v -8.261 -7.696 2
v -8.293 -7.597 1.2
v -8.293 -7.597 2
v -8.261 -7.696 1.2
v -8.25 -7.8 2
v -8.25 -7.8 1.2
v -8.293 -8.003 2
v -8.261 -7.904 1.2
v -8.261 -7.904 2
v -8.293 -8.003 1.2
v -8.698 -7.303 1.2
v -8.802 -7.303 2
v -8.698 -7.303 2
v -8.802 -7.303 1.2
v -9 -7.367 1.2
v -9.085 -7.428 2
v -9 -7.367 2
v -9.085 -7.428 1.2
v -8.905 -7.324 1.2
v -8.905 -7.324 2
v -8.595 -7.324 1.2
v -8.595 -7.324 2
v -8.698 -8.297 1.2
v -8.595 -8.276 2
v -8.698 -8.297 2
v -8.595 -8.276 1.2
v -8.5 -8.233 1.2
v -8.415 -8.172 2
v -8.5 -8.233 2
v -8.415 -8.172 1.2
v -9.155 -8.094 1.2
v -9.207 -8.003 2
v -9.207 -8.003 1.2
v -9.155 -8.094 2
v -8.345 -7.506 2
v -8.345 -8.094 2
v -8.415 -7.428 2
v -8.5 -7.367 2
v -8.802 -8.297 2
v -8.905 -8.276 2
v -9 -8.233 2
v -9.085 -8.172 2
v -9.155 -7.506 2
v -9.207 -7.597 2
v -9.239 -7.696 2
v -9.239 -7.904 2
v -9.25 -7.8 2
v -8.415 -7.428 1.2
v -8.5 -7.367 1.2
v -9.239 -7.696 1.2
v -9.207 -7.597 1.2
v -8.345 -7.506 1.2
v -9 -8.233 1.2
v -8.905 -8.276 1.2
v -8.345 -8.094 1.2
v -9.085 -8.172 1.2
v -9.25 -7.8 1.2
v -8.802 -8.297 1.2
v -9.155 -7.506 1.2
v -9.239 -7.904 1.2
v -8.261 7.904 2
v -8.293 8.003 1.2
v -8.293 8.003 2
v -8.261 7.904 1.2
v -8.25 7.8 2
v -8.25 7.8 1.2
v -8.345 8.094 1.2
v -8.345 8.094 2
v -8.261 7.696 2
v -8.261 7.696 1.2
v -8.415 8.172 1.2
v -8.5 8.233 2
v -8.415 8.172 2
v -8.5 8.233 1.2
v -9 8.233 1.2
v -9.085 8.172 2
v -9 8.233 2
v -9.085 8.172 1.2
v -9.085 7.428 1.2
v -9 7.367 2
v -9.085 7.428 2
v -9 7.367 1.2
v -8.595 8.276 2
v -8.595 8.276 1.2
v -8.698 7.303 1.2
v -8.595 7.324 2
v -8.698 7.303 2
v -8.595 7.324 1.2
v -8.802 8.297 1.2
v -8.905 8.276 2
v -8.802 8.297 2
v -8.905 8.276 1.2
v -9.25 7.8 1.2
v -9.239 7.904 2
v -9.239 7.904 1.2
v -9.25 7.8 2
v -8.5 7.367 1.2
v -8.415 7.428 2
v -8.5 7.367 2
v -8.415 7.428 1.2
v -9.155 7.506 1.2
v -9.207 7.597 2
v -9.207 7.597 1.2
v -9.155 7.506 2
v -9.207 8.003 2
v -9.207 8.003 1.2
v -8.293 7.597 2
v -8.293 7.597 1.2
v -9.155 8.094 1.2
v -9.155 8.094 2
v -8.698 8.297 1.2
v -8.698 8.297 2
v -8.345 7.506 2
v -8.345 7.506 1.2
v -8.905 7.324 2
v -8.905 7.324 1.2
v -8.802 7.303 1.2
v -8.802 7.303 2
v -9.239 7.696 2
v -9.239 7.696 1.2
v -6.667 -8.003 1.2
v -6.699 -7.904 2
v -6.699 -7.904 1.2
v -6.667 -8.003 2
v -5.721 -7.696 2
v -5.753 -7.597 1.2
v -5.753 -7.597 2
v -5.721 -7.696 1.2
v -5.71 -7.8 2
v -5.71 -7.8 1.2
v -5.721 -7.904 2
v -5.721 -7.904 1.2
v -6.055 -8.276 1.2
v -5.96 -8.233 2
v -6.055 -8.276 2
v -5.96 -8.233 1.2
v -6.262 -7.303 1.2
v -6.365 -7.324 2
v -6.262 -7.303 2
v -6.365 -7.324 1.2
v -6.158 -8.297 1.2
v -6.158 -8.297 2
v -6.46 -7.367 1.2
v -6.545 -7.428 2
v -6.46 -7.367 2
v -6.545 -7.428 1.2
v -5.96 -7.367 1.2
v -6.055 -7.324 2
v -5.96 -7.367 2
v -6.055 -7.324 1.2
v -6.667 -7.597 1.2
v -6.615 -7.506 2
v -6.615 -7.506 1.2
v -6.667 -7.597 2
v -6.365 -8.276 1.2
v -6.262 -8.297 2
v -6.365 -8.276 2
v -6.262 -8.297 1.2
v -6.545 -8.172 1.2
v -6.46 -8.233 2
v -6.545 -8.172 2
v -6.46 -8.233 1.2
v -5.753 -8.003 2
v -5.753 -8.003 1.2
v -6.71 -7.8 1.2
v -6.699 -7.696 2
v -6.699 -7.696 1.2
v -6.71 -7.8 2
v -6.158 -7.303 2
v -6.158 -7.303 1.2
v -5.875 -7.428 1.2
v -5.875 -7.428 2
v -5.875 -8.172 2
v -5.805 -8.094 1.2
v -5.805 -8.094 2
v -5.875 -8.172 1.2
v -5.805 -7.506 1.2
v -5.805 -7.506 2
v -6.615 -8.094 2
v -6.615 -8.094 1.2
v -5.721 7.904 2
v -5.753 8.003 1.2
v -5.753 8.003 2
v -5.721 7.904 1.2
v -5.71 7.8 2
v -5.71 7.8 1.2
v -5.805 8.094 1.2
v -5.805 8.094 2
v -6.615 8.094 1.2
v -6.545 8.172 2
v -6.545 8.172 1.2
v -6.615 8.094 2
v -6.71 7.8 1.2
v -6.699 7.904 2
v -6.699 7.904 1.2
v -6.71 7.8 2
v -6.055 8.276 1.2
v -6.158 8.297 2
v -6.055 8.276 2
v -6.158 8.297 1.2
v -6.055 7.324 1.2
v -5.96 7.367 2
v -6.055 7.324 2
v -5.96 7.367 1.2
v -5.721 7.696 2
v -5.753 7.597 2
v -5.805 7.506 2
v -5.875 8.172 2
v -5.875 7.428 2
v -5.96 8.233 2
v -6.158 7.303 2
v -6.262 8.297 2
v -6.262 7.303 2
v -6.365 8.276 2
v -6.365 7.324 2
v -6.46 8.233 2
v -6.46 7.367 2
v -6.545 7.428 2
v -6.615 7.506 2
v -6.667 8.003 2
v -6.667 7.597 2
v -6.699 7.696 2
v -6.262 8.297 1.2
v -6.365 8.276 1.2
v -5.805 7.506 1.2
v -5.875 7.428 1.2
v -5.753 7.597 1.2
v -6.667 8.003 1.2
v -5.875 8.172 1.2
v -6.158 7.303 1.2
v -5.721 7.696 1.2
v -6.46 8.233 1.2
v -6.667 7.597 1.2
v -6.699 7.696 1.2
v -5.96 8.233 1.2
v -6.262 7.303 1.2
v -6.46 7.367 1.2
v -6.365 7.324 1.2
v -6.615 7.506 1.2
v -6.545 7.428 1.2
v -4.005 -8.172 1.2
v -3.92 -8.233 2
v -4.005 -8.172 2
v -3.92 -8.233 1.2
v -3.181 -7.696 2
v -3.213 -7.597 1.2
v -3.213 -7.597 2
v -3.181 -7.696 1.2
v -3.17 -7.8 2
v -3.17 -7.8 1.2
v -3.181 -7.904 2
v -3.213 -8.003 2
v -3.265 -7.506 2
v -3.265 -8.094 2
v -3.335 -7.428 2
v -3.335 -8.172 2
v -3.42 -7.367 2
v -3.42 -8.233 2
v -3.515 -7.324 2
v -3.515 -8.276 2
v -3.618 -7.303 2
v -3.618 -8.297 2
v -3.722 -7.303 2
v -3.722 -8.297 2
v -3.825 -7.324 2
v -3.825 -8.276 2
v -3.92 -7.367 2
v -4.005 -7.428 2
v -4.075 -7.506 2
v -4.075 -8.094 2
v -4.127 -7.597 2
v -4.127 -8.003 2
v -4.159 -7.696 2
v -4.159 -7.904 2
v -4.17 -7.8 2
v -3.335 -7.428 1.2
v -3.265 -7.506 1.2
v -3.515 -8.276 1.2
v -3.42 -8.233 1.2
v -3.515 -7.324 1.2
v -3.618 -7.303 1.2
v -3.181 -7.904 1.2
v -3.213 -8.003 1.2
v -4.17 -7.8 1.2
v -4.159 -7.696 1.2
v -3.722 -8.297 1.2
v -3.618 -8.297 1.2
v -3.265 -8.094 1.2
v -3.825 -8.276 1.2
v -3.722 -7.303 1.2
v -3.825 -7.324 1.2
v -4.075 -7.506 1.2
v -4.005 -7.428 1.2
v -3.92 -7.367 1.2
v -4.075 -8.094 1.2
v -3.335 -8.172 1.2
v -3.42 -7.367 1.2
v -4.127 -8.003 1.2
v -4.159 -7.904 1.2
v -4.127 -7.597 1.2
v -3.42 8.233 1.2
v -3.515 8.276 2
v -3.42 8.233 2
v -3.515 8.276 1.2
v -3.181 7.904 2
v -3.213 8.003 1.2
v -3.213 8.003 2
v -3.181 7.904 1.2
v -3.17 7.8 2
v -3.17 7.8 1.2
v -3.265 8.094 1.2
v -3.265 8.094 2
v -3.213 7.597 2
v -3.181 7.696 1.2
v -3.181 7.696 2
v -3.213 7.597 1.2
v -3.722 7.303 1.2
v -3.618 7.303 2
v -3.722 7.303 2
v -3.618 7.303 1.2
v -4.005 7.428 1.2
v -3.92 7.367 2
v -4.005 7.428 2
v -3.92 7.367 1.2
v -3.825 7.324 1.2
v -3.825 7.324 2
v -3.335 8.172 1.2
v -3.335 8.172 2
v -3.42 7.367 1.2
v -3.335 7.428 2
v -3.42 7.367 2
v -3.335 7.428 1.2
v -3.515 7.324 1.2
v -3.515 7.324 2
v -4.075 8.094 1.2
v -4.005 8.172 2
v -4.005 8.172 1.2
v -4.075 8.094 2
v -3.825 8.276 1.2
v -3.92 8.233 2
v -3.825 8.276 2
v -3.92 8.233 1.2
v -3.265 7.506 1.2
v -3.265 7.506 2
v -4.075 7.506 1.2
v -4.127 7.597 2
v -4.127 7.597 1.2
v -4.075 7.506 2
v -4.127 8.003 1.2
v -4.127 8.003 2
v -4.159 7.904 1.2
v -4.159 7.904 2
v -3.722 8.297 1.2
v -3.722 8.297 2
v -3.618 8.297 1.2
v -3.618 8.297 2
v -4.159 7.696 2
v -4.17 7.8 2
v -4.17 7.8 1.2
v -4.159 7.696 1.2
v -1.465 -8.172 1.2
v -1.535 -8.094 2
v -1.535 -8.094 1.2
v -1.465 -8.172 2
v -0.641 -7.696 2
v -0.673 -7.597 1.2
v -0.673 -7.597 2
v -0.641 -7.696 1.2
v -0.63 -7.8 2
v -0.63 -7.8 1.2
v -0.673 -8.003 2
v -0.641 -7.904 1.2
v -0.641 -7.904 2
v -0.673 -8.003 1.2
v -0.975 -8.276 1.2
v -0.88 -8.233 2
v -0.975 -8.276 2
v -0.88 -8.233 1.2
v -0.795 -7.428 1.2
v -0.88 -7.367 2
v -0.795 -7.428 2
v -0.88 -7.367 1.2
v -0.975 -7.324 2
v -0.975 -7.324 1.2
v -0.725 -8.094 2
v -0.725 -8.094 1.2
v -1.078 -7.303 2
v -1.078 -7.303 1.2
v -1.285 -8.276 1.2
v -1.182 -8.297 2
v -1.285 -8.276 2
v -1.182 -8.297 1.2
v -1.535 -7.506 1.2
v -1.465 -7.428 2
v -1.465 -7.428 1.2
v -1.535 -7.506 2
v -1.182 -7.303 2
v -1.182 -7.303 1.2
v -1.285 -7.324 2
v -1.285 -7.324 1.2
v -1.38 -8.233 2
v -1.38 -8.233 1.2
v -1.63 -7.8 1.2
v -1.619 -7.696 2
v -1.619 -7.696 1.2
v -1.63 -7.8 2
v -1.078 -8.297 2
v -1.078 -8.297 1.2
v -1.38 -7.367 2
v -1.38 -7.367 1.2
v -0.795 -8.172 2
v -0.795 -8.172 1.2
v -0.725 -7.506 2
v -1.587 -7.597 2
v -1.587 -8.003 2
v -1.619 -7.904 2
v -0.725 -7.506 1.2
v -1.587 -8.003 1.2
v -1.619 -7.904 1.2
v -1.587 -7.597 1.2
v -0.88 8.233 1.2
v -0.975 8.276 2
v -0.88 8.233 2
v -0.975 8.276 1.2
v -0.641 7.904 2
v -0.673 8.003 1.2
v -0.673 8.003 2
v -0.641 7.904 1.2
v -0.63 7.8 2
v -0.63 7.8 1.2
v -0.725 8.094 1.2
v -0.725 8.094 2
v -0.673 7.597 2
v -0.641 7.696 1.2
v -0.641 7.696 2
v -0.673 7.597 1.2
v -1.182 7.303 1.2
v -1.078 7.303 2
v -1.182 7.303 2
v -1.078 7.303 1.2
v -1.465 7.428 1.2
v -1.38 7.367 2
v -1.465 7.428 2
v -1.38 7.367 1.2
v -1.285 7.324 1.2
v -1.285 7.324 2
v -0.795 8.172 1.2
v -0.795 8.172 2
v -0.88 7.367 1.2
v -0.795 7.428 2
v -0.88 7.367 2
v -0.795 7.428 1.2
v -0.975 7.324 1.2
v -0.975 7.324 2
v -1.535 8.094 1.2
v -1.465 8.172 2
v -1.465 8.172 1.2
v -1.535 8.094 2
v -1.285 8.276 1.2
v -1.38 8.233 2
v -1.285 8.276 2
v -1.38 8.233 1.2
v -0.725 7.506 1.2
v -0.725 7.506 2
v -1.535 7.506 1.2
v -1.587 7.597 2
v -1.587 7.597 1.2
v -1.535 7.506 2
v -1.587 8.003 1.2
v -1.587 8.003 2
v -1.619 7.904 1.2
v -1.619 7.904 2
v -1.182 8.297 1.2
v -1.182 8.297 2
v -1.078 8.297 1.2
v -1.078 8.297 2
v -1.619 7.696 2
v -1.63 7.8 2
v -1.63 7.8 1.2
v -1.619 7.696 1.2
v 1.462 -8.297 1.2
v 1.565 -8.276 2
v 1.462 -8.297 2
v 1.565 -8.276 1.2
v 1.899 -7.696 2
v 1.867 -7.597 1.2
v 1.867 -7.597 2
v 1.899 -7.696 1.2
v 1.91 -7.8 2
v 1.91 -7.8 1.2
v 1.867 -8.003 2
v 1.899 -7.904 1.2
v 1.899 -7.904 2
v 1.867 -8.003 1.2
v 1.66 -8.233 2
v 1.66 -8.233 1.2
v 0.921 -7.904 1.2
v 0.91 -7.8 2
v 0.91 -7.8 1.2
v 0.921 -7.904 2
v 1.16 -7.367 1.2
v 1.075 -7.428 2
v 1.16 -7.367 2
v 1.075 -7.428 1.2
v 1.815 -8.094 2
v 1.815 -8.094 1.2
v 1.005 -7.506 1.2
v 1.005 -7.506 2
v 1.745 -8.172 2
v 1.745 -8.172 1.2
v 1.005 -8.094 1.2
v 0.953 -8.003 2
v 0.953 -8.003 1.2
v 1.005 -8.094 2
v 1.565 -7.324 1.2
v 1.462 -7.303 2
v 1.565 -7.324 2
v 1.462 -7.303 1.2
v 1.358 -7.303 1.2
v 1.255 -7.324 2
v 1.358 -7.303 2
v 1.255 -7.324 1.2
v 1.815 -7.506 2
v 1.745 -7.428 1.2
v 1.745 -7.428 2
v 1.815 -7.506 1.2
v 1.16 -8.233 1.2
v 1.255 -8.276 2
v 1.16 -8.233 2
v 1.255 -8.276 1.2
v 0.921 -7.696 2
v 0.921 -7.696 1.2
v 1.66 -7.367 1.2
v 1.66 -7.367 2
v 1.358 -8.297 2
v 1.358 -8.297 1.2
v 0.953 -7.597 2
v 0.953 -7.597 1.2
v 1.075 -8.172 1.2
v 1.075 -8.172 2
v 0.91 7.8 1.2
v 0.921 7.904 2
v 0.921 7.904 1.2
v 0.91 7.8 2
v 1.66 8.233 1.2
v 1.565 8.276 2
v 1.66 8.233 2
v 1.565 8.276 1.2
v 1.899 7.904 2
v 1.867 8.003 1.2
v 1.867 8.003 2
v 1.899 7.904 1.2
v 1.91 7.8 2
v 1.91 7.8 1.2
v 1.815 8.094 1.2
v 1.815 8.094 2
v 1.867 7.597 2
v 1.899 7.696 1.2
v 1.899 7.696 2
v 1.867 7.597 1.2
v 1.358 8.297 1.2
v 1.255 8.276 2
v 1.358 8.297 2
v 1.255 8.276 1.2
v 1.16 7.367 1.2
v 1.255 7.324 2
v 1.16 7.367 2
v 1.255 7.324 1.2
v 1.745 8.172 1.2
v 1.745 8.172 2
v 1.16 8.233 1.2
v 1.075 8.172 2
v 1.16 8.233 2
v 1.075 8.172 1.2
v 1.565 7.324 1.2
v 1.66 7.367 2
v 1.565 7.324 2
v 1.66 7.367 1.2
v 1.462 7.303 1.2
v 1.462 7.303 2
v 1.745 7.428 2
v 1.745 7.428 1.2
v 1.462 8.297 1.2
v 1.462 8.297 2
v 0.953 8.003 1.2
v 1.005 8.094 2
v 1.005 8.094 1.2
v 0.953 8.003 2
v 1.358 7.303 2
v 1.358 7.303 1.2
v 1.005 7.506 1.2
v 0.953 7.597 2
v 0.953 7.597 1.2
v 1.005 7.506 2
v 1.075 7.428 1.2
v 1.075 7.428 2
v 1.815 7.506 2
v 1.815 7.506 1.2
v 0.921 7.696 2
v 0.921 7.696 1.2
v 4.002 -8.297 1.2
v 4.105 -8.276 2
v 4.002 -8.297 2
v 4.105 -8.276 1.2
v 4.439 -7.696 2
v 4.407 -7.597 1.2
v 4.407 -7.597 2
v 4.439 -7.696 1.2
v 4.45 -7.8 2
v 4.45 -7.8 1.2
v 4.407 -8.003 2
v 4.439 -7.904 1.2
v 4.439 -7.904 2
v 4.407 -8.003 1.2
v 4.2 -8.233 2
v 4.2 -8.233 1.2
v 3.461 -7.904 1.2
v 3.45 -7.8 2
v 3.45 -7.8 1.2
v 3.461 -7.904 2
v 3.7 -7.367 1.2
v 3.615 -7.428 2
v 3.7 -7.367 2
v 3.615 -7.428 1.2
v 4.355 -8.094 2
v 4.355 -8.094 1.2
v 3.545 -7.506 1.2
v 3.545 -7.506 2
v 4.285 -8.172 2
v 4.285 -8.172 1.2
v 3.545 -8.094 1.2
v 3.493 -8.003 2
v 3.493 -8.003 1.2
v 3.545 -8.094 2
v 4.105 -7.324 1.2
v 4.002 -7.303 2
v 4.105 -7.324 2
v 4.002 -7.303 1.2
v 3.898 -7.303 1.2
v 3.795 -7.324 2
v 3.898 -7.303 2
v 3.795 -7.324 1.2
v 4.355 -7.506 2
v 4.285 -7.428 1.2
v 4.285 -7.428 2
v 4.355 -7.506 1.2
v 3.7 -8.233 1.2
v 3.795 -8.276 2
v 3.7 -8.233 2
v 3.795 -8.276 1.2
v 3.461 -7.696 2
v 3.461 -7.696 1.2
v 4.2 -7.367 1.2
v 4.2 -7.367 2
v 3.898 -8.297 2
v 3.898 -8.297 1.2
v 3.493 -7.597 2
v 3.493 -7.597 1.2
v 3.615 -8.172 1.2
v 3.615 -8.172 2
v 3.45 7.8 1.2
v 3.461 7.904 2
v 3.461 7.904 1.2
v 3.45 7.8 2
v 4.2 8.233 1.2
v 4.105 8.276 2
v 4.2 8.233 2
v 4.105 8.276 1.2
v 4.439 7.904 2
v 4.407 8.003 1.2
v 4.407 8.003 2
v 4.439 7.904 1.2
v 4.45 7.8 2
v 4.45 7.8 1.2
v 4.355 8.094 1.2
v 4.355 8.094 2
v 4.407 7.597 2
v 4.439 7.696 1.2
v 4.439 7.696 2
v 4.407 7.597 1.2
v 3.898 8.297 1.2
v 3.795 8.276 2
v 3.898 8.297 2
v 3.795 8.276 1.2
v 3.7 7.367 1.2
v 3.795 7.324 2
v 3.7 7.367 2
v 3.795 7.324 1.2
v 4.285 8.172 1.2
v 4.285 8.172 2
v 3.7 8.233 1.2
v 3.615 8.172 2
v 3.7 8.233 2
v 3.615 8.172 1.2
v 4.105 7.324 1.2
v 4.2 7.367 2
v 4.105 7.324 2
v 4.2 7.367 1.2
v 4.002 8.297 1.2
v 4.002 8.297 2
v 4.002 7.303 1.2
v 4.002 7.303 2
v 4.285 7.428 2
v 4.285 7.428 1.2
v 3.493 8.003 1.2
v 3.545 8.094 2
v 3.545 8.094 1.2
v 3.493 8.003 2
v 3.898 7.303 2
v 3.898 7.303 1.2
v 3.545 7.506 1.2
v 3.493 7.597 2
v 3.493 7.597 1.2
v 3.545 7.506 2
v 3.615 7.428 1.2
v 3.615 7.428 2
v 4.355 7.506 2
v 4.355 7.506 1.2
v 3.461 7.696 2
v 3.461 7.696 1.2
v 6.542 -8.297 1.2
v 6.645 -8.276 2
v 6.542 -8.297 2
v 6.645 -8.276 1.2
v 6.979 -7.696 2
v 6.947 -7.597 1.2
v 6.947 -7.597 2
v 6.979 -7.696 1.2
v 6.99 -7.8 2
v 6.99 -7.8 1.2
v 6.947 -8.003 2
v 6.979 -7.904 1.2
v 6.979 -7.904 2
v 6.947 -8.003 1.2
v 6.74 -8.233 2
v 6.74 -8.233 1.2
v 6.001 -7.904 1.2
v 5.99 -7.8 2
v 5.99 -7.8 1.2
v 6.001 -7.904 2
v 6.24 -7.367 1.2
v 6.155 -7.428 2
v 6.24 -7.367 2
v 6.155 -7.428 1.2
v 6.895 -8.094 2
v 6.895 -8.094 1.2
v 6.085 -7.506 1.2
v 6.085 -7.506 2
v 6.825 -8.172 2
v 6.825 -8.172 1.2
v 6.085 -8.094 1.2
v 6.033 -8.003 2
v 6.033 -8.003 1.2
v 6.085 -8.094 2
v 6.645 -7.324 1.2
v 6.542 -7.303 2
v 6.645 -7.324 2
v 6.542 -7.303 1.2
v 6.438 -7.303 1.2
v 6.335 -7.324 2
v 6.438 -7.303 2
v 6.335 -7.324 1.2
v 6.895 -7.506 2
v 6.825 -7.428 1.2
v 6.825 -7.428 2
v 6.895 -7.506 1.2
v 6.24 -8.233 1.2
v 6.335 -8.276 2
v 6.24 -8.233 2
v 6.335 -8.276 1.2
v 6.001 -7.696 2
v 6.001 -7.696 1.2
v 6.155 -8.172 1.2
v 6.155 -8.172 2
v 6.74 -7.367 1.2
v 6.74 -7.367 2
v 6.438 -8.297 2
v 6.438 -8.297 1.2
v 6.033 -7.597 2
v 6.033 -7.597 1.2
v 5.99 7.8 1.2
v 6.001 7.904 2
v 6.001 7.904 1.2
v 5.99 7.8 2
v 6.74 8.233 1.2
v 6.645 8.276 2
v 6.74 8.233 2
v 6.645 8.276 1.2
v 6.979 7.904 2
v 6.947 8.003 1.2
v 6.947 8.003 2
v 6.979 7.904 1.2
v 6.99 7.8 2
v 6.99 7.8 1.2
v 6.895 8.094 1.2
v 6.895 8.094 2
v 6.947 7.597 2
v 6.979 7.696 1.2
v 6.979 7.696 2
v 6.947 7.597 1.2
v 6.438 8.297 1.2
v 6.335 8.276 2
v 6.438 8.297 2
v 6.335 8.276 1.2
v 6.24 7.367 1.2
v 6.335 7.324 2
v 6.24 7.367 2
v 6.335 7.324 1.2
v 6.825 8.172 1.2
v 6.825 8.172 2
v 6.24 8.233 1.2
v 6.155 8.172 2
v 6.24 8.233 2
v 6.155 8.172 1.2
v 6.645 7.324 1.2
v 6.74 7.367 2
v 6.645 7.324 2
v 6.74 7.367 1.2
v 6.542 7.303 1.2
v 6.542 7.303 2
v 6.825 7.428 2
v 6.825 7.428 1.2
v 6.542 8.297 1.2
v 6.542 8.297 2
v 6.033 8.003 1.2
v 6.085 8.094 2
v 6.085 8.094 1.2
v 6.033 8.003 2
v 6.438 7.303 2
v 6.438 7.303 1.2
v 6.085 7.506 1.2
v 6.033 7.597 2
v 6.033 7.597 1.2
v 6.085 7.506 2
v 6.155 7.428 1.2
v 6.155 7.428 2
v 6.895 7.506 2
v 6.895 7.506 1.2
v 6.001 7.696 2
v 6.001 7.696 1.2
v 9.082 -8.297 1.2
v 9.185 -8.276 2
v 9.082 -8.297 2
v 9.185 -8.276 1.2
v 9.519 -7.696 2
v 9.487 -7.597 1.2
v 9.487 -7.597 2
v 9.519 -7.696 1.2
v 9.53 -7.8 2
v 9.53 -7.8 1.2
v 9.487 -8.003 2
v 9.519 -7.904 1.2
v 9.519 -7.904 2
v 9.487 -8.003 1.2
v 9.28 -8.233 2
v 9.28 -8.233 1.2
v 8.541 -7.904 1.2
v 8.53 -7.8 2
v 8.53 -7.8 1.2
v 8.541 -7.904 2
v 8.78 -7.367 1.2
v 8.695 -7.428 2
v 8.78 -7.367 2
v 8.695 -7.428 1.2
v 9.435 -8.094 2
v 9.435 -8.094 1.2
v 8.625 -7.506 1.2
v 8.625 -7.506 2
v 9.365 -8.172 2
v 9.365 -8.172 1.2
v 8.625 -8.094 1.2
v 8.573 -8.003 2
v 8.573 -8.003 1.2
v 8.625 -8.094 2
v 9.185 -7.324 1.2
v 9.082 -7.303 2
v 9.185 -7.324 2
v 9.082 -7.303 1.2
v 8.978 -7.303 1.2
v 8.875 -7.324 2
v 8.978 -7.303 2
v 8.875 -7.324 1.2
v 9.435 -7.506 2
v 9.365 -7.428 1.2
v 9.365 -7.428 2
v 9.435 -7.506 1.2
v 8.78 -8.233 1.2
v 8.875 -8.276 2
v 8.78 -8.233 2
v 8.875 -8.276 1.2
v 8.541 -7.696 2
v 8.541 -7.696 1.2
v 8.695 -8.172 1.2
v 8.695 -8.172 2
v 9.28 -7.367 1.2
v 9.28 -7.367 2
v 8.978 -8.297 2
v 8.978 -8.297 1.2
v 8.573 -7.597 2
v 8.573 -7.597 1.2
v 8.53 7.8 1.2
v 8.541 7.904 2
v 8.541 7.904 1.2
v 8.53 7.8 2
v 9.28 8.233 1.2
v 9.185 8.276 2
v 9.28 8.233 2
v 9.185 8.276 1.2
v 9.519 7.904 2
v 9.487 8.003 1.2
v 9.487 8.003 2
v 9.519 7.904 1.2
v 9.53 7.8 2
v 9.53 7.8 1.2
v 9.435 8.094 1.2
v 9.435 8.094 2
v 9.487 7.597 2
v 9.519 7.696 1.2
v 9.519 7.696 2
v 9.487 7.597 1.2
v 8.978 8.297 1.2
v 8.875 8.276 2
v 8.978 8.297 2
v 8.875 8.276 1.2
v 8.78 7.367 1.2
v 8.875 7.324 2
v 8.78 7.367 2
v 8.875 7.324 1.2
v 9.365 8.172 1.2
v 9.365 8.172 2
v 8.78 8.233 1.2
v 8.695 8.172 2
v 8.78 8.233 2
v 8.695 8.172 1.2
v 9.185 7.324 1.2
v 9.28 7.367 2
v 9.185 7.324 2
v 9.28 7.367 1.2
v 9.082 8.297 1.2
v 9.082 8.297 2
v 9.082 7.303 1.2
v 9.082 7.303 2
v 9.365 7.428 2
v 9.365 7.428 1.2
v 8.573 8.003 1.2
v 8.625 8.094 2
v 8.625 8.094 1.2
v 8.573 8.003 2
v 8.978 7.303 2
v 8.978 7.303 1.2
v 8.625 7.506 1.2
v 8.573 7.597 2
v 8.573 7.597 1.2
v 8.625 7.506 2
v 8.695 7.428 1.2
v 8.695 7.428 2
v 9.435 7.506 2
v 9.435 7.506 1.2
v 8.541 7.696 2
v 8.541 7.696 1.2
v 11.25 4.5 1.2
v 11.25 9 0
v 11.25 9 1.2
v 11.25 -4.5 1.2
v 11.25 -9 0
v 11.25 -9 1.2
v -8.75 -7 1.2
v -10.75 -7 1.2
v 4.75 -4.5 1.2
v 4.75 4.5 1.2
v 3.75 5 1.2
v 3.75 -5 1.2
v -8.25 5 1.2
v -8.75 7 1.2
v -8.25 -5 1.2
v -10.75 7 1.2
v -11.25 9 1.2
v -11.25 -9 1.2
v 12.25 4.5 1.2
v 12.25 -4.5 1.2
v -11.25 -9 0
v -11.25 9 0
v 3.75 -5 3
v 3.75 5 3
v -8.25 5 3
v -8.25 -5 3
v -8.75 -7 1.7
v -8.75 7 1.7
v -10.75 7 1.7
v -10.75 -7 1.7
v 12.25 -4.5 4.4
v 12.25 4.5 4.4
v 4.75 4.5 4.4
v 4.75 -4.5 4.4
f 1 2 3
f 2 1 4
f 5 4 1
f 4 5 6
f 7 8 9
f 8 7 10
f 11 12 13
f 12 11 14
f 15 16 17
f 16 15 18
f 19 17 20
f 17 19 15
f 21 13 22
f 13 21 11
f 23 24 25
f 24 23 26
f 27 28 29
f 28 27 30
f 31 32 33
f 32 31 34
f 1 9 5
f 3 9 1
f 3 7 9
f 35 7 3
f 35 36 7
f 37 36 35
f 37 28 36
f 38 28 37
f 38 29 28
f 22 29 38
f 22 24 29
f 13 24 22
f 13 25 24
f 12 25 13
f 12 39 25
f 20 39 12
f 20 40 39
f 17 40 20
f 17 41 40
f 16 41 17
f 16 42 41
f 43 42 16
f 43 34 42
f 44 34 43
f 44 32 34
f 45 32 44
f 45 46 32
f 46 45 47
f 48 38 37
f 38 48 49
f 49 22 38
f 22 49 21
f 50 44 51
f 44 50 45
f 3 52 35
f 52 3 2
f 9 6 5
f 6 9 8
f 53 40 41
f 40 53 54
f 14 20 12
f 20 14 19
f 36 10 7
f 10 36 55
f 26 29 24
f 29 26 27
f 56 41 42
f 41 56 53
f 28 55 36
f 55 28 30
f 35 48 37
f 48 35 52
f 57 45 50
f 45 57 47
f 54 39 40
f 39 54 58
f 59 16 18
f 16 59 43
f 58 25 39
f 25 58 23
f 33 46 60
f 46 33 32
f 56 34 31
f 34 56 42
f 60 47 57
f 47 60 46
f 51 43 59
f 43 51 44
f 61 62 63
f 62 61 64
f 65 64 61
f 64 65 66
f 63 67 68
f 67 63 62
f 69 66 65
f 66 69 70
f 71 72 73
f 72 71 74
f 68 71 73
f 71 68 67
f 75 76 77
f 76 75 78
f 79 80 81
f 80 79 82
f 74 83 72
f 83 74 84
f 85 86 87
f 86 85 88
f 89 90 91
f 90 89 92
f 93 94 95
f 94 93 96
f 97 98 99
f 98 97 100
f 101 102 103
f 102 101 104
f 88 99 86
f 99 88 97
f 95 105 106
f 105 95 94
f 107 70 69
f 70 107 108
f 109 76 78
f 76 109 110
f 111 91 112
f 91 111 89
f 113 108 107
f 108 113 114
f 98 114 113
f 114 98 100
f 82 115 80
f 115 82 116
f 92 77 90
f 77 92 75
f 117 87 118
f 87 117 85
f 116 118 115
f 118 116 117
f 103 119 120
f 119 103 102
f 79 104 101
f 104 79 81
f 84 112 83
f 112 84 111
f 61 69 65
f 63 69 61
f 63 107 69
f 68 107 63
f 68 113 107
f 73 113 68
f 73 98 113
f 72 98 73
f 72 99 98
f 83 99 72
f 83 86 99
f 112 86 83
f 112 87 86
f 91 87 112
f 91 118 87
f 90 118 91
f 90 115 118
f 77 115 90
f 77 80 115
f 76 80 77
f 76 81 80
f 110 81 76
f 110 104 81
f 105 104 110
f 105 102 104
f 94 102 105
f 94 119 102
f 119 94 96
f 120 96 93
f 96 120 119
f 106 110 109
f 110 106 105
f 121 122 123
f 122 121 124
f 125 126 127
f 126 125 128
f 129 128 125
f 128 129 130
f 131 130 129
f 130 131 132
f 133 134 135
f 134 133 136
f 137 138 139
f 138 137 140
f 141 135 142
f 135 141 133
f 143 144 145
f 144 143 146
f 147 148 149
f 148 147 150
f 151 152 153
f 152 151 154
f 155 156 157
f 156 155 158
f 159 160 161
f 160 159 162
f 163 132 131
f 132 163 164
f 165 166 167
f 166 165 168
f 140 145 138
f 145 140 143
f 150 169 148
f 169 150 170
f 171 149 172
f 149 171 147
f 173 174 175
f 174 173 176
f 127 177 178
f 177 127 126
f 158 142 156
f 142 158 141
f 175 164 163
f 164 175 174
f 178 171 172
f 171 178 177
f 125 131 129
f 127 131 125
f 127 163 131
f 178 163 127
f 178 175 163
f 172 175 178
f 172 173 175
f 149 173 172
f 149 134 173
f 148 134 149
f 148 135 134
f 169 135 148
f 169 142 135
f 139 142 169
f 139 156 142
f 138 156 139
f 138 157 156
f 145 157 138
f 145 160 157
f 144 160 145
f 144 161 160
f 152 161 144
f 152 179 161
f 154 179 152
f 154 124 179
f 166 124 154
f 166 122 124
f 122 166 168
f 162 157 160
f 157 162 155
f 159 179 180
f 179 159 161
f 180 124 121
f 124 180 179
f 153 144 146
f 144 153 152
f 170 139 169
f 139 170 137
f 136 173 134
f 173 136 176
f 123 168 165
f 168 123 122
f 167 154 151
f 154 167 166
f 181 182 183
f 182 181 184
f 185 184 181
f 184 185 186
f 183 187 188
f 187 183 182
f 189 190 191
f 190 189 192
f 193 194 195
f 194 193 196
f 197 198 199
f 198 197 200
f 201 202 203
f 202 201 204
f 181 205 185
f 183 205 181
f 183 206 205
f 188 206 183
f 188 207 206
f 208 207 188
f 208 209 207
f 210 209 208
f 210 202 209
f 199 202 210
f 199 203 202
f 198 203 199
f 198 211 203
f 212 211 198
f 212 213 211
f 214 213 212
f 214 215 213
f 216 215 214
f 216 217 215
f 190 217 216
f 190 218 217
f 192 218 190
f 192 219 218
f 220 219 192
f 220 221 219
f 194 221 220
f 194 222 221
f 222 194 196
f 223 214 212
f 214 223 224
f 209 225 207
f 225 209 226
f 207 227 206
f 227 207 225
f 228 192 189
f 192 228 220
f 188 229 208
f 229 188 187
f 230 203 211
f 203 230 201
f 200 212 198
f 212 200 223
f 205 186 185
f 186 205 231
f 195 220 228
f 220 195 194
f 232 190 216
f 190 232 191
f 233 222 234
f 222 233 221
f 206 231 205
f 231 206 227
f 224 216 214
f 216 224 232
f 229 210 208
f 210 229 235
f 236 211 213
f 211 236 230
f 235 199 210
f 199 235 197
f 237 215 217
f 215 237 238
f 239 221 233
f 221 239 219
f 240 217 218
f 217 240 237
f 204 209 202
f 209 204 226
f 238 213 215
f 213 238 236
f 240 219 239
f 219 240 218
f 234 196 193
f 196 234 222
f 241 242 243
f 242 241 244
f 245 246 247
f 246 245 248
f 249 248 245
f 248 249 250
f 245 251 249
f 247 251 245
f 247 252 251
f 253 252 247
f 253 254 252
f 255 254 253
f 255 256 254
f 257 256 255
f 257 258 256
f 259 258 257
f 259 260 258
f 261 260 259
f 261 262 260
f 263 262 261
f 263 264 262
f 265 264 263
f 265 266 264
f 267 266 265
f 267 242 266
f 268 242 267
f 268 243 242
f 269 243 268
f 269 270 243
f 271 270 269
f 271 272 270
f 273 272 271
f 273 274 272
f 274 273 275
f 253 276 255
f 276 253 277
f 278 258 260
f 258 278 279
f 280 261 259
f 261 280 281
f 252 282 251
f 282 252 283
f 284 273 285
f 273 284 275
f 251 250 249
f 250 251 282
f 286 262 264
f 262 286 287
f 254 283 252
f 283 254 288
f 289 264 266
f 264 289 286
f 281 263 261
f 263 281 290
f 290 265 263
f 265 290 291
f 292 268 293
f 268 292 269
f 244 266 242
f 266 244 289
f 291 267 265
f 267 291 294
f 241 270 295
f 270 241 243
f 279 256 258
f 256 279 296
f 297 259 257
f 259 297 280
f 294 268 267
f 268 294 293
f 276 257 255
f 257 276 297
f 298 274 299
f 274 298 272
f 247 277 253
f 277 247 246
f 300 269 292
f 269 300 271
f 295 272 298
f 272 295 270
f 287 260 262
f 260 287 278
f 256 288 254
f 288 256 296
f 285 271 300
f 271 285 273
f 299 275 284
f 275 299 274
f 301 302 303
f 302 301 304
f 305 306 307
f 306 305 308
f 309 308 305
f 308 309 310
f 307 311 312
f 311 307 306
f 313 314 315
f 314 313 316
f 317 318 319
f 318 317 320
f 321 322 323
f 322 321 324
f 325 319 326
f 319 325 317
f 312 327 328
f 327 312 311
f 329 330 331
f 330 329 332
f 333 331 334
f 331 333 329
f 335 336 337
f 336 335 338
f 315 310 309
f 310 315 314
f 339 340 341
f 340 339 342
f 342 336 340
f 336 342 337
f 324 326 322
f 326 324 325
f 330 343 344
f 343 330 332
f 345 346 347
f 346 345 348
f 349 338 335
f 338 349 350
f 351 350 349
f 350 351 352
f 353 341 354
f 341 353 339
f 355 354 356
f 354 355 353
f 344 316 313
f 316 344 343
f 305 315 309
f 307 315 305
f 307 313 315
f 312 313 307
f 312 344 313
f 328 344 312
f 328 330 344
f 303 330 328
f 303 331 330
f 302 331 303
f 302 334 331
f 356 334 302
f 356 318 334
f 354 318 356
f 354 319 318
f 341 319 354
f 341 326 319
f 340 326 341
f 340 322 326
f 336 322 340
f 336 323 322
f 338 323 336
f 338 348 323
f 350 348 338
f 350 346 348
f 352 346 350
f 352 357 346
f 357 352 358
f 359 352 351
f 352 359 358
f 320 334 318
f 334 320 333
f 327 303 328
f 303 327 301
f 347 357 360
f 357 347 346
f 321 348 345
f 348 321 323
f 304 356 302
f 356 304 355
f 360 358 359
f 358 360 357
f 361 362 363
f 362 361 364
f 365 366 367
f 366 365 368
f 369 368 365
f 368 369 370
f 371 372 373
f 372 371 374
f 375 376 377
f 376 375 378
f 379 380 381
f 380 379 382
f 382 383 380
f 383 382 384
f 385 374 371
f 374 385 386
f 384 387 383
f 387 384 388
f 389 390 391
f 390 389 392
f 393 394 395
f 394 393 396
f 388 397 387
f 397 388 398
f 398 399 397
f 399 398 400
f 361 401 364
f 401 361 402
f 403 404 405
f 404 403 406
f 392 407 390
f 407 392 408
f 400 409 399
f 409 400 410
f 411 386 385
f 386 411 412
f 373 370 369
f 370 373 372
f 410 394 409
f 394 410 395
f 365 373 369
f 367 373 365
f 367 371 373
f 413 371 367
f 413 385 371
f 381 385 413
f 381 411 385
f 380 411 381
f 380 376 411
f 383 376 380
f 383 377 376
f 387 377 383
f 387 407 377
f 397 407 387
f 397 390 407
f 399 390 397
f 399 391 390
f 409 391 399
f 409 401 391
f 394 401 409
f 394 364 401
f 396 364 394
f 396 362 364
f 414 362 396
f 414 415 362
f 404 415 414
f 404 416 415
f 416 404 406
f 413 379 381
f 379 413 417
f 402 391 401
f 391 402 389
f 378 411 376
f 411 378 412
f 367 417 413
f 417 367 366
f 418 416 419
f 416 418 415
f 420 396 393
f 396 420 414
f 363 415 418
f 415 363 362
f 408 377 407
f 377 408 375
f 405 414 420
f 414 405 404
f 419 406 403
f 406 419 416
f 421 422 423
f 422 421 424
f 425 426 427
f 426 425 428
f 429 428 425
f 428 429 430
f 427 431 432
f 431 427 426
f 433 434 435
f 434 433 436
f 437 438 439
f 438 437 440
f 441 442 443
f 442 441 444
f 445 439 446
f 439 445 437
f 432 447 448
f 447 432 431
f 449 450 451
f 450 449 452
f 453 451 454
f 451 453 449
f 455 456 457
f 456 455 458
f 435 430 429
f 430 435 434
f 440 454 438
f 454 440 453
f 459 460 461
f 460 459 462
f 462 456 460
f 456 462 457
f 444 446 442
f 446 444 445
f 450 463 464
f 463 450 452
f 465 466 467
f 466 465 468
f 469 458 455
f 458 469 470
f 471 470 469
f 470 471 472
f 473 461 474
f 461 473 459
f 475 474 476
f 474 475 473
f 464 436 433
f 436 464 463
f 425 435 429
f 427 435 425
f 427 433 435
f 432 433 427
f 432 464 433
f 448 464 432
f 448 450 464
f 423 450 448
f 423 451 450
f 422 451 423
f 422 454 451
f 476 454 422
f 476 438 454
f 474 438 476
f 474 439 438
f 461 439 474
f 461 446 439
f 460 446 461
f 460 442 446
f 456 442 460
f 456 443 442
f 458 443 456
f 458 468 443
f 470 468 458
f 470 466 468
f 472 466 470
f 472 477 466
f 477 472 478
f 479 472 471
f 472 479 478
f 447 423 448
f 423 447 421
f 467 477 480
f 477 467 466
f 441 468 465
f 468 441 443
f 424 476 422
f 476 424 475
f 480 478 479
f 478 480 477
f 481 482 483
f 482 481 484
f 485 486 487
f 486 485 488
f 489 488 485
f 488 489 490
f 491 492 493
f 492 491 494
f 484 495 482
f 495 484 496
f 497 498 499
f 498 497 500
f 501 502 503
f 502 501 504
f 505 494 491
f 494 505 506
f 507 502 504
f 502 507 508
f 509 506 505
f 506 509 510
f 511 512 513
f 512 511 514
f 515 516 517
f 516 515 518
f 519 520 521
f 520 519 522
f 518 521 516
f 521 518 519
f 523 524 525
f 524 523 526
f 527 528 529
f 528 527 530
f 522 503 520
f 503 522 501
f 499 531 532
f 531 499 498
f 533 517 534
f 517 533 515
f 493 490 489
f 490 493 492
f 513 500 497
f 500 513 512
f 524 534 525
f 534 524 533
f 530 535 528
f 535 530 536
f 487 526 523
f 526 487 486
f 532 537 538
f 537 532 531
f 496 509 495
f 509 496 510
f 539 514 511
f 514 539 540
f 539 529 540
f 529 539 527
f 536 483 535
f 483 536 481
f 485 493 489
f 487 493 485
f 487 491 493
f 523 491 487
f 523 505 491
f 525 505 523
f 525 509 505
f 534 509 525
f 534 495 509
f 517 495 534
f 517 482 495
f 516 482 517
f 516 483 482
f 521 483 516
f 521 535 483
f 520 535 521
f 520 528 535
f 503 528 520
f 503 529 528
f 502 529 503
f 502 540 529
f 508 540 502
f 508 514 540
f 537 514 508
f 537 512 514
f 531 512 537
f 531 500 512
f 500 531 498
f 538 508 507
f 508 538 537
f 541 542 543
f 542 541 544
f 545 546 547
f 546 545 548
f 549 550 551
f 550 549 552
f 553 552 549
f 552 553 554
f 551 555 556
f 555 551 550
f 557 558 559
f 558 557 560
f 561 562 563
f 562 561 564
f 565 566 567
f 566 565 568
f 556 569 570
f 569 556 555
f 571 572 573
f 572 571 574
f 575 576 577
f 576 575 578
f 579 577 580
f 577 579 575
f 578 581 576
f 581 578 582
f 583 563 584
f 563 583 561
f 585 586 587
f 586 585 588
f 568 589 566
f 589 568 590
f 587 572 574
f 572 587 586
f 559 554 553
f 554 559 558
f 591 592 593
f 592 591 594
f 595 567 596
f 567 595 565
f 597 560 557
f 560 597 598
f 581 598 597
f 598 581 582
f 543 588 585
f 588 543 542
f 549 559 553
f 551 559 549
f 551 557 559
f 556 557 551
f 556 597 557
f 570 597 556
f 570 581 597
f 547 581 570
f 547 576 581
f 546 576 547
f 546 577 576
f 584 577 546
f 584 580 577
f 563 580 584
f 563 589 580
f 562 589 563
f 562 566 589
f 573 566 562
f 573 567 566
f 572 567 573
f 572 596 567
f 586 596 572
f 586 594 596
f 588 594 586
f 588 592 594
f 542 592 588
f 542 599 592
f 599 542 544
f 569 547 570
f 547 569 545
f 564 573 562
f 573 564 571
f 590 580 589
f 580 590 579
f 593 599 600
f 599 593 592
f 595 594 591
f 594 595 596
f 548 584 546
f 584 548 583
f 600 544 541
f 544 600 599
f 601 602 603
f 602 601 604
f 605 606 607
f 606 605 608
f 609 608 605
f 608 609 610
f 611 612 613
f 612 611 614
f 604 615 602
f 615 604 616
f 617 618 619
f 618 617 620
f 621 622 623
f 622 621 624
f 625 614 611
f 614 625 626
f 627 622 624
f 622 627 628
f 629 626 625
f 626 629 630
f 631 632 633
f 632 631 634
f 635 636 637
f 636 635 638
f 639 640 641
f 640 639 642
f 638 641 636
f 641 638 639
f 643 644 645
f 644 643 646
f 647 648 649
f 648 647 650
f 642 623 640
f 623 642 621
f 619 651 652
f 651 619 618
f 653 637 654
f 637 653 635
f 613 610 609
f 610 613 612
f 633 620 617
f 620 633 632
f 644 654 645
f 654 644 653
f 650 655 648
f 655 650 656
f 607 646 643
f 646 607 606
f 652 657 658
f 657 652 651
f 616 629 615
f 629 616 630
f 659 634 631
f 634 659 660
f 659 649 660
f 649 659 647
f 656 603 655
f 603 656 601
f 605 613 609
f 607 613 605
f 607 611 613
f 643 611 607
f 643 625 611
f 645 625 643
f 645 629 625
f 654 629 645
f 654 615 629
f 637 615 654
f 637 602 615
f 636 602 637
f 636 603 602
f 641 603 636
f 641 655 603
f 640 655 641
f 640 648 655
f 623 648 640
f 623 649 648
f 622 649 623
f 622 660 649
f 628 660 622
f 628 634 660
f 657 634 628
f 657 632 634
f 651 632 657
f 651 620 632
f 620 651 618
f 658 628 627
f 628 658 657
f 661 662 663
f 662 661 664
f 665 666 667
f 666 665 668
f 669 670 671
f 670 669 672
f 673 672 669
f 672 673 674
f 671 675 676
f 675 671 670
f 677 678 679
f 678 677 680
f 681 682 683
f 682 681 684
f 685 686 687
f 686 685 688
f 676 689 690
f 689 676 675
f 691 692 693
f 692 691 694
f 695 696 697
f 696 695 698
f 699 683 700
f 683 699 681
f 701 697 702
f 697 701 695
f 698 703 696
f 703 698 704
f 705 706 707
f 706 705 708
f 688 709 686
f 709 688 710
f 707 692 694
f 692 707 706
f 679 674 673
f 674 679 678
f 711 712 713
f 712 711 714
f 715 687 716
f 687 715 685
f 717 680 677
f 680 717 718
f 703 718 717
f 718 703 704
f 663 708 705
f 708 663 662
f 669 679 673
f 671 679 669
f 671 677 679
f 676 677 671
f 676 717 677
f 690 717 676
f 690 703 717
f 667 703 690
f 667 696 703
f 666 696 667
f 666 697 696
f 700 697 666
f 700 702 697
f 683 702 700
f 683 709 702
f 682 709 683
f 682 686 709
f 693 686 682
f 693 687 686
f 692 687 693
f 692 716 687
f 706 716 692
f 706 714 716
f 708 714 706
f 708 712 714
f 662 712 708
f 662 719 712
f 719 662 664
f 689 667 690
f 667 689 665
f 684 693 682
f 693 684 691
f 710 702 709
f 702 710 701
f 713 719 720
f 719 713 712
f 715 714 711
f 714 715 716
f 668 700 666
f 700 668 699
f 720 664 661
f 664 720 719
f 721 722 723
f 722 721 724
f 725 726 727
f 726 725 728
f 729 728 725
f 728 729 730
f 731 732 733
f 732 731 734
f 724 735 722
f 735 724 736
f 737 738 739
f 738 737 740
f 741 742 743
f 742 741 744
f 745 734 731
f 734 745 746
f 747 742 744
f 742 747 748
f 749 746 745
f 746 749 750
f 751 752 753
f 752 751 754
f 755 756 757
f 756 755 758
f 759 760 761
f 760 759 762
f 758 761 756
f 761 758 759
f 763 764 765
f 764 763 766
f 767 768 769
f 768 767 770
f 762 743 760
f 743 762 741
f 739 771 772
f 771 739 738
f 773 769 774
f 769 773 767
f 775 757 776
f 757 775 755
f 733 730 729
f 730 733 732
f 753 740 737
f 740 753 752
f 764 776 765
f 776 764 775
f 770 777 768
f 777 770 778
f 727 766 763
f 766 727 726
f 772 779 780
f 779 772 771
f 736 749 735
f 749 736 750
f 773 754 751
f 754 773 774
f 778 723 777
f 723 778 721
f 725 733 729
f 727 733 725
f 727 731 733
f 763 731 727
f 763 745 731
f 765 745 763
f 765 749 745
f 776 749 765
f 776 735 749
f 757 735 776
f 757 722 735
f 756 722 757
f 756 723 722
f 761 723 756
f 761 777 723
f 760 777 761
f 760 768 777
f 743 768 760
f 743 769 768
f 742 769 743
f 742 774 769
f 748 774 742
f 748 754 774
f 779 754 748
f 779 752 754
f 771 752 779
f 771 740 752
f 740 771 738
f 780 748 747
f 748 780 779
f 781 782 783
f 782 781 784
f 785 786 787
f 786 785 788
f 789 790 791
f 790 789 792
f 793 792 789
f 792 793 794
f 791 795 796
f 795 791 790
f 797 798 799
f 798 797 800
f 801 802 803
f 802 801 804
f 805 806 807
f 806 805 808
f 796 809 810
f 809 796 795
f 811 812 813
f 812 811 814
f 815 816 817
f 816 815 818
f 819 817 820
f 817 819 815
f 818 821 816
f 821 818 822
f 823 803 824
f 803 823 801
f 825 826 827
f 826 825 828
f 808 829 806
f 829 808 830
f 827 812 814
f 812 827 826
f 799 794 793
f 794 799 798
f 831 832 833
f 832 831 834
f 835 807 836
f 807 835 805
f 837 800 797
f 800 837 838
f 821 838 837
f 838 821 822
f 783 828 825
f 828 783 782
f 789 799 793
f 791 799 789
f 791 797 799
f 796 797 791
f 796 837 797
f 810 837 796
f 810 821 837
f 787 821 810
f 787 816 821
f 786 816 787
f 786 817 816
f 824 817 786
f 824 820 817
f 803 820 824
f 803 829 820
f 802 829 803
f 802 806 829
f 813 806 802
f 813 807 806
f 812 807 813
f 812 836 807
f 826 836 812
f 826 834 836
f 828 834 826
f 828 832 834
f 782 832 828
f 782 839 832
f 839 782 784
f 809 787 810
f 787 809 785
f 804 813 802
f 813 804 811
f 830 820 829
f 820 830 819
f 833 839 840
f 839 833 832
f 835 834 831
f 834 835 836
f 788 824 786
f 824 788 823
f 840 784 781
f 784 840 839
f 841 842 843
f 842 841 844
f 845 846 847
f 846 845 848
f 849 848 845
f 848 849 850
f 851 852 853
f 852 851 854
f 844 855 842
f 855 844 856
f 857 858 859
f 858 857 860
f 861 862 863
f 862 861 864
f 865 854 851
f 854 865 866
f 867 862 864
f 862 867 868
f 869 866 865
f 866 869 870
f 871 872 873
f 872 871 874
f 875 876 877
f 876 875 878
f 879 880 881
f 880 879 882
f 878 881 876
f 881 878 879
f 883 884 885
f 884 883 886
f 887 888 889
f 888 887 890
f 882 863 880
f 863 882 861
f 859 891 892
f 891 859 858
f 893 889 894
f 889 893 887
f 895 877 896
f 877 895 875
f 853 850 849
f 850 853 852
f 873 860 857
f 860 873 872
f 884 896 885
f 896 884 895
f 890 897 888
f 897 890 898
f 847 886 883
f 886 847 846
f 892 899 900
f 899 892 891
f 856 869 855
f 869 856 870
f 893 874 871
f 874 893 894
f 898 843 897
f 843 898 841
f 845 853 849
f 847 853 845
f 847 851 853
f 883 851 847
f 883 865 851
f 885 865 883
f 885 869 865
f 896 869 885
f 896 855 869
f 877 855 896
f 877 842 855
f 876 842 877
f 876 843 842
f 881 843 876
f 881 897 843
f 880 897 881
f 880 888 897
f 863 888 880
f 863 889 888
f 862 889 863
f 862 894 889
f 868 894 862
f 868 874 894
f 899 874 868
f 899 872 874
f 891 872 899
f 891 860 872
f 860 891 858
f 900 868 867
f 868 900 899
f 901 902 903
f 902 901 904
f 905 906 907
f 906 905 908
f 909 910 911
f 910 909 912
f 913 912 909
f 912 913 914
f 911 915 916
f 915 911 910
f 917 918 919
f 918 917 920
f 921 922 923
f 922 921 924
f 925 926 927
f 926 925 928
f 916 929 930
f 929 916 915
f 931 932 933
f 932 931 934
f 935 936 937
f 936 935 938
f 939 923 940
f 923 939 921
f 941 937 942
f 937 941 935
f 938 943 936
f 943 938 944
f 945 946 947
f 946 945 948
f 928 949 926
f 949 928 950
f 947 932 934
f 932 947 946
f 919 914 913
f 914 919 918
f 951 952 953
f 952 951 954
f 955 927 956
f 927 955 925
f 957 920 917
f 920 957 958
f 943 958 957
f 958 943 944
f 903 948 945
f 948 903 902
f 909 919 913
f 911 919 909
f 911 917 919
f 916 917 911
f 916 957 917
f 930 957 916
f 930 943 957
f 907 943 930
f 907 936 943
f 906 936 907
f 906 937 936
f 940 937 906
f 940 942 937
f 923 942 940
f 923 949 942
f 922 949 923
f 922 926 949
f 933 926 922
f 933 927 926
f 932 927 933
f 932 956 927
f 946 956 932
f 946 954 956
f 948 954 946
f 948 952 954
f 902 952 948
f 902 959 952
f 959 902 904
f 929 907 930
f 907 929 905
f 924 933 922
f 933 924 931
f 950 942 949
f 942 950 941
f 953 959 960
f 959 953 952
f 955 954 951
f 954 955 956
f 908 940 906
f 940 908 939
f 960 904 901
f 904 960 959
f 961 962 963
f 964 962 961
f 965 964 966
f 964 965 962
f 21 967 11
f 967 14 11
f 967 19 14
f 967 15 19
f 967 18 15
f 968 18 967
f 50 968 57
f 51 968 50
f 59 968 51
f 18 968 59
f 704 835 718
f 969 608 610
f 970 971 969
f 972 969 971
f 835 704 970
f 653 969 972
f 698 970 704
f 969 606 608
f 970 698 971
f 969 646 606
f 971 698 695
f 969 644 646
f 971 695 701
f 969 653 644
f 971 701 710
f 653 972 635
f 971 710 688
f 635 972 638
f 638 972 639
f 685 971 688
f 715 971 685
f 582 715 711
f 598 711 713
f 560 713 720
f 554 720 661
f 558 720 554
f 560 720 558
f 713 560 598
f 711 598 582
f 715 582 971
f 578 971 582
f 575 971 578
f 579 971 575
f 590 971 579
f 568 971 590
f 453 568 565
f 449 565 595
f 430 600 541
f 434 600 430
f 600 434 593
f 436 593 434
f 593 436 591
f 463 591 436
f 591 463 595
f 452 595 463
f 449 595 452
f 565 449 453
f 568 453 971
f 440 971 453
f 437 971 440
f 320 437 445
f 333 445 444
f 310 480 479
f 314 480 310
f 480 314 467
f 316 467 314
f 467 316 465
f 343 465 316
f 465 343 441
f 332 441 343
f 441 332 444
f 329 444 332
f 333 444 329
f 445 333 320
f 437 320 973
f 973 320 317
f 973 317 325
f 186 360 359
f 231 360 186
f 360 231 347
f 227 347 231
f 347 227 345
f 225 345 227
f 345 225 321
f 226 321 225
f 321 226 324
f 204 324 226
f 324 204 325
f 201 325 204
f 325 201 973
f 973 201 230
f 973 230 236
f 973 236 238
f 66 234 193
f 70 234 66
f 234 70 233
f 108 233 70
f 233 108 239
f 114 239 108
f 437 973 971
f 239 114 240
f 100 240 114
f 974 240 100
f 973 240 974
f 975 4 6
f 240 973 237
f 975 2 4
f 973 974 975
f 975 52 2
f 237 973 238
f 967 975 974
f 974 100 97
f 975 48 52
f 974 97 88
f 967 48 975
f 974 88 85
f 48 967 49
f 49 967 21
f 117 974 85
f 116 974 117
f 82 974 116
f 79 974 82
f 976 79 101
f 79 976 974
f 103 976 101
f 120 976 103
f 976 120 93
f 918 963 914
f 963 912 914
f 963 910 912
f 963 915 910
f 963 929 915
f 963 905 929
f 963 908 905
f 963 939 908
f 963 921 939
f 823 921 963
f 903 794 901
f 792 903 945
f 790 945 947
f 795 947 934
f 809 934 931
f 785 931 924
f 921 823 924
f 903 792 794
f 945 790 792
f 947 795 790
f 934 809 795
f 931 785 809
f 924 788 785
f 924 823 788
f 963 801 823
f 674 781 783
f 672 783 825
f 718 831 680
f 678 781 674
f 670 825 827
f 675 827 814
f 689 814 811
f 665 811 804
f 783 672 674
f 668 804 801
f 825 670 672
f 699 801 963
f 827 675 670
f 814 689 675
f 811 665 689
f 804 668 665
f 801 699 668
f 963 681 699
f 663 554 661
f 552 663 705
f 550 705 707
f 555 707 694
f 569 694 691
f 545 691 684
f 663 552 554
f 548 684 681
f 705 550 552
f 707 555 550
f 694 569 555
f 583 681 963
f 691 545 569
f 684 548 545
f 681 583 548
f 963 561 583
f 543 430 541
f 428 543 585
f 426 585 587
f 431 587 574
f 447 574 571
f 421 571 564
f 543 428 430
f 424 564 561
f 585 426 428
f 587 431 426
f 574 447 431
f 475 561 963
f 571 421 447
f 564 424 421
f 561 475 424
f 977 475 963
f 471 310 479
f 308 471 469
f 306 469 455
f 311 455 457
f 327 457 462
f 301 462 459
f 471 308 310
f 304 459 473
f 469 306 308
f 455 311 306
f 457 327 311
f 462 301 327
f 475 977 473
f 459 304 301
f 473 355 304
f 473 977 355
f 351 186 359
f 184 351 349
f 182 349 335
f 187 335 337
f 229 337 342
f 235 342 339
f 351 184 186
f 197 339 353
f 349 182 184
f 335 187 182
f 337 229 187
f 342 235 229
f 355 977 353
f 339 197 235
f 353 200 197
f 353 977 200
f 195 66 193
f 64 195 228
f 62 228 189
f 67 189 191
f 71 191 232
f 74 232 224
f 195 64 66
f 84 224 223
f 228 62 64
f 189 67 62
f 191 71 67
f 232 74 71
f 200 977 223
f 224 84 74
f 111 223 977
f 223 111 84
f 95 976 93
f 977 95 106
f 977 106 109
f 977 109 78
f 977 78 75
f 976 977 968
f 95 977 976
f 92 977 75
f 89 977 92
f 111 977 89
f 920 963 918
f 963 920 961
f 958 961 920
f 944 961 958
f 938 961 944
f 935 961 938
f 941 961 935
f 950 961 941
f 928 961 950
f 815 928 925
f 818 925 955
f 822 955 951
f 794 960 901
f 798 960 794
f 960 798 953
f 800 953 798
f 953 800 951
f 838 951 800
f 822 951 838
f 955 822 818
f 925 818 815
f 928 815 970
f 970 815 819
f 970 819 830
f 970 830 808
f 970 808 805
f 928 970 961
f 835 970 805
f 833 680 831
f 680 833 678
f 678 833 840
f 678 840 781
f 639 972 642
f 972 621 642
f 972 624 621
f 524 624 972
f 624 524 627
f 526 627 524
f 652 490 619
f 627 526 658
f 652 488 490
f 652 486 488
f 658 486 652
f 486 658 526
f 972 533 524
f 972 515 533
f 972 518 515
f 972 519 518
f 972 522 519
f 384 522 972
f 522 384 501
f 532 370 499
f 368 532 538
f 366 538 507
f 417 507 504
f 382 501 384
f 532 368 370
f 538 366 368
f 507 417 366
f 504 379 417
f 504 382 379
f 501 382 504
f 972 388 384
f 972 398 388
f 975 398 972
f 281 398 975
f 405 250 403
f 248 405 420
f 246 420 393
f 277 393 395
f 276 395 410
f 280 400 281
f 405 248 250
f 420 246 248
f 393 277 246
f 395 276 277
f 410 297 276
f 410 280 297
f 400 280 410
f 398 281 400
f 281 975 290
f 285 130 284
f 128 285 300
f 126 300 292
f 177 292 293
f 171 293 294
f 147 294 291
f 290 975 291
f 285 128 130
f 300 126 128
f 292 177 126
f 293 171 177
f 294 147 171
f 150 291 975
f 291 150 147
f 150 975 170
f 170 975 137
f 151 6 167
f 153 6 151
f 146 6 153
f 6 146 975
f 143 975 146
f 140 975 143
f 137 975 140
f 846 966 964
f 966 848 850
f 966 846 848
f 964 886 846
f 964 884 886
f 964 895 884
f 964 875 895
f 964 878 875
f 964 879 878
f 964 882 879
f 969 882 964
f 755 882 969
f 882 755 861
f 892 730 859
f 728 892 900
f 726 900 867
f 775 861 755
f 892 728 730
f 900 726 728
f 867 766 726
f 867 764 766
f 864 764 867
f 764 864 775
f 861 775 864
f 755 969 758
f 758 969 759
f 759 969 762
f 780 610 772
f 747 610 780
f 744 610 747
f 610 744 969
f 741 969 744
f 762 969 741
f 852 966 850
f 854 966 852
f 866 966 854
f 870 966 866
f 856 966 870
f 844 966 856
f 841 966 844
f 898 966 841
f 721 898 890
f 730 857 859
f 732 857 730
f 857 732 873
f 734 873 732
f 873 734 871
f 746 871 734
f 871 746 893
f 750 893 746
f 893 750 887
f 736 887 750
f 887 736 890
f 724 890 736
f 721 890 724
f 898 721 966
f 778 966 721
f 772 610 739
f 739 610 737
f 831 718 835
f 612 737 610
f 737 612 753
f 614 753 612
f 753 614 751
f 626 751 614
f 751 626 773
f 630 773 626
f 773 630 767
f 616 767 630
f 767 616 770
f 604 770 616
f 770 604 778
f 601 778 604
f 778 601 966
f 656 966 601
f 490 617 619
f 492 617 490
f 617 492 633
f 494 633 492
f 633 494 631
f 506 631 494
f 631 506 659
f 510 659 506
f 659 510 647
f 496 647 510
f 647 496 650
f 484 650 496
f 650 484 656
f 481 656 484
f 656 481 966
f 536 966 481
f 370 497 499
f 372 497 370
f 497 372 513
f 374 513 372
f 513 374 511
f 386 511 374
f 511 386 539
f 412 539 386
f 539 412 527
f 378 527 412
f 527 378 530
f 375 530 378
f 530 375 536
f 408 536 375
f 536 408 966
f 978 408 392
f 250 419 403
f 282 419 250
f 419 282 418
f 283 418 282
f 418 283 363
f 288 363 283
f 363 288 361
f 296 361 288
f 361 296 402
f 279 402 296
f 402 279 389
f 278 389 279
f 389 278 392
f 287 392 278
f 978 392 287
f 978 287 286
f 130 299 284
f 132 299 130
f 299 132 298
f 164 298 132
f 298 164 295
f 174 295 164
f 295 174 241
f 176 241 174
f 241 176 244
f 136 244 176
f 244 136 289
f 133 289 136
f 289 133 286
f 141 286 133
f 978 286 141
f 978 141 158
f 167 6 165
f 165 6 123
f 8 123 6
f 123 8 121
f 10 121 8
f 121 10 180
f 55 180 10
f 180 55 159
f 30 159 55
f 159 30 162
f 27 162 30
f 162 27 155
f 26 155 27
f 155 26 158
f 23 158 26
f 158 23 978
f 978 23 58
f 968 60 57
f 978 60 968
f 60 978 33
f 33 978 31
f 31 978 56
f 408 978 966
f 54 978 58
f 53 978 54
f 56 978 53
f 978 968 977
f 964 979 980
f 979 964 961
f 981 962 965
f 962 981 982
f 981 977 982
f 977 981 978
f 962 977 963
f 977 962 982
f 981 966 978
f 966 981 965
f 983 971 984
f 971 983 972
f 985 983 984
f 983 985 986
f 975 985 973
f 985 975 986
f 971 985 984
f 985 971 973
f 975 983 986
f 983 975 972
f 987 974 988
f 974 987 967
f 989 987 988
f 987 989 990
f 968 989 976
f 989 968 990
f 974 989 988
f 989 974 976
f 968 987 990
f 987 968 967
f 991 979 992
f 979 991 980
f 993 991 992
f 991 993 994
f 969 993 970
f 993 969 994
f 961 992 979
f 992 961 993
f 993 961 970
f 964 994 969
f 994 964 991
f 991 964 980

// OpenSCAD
// ===================================================================
// ESP32-C3 SuperMini 极小核心开发板
// 工业标准 1:1 CAD 实体模型
// ===================================================================

$fn = 30;

module esp32_c3() {
    // 1. 经典紫色/深黑 PCB 基板 (22.5 x 18.0 x 1.2 mm)
    color([0.15, 0.12, 0.25]) {
        translate([-22.5/2, -18.0/2, 0])
            cube([22.5, 18.0, 1.2]);
    }

    // 2. 金属屏蔽罩 (RF Shield Can: 12.0 x 10.0 x 1.8 mm)
    color([0.75, 0.75, 0.8]) {
        translate([-22.5/2 + 3.0, -5.0, 1.2])
            cube([12.0, 10.0, 1.8]);
    }

    // 3. 板载板载高频陶瓷/PCB 天线区 (金色条纹)
    color([0.8, 0.65, 0.2]) {
        translate([-22.5/2 + 0.5, -7.0, 1.2])
            cube([2.0, 14.0, 0.5]);
    }

    // 4. Type-C 母座接口 (位于一侧边缘，9.0 x 7.5 x 3.2 mm，凸出板边约 1.2mm)
    color([0.85, 0.85, 0.9]) {
        translate([22.5/2 - 6.5, -4.5, 1.2])
            cube([7.5, 9.0, 3.2]);
    }

    // 5. 镀金排针焊盘 (两排 8-pin 2.54mm 间距焊盘)
    color([0.9, 0.75, 0.2]) {
        for (i = [0 : 7]) {
            // 下排焊盘
            translate([-22.5/2 + 2.5 + i * 2.54, -18.0/2 + 1.2, 0.5])
                cylinder(d=1.0, h=1.5);
            // 上排焊盘
            translate([-22.5/2 + 2.5 + i * 2.54, 18.0/2 - 1.2, 0.5])
                cylinder(d=1.0, h=1.5);
        }
    }
}

esp32_c3();
